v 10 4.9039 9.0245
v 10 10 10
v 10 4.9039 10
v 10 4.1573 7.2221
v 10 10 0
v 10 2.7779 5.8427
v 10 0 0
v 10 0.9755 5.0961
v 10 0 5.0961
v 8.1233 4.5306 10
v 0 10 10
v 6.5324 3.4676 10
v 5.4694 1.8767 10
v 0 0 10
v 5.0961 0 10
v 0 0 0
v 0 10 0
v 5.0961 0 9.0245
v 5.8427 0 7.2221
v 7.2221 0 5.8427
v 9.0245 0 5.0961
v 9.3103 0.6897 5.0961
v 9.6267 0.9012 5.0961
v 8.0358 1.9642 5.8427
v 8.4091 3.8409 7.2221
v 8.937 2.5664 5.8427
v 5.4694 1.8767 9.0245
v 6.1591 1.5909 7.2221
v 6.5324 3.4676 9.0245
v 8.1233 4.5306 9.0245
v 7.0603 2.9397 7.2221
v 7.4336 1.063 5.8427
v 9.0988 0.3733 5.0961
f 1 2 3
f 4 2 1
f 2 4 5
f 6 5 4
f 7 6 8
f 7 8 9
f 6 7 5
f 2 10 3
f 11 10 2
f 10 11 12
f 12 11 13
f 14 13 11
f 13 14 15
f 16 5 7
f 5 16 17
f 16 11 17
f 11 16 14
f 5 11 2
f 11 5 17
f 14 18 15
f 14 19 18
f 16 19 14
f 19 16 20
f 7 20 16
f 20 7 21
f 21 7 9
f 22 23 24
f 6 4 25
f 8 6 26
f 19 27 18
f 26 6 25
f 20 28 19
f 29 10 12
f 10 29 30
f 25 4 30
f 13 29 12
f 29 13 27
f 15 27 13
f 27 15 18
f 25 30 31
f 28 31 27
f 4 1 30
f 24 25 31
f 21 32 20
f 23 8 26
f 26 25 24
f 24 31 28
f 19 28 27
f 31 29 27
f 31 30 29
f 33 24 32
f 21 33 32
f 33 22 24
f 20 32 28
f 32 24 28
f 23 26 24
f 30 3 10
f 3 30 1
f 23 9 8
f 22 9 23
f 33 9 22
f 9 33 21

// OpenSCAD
difference ()
{
    color([1,0,0])
    cube ([10,10,10]);

    color([0,0,1])
    translate ([10,0,10])
    sphere (r=5);
}
